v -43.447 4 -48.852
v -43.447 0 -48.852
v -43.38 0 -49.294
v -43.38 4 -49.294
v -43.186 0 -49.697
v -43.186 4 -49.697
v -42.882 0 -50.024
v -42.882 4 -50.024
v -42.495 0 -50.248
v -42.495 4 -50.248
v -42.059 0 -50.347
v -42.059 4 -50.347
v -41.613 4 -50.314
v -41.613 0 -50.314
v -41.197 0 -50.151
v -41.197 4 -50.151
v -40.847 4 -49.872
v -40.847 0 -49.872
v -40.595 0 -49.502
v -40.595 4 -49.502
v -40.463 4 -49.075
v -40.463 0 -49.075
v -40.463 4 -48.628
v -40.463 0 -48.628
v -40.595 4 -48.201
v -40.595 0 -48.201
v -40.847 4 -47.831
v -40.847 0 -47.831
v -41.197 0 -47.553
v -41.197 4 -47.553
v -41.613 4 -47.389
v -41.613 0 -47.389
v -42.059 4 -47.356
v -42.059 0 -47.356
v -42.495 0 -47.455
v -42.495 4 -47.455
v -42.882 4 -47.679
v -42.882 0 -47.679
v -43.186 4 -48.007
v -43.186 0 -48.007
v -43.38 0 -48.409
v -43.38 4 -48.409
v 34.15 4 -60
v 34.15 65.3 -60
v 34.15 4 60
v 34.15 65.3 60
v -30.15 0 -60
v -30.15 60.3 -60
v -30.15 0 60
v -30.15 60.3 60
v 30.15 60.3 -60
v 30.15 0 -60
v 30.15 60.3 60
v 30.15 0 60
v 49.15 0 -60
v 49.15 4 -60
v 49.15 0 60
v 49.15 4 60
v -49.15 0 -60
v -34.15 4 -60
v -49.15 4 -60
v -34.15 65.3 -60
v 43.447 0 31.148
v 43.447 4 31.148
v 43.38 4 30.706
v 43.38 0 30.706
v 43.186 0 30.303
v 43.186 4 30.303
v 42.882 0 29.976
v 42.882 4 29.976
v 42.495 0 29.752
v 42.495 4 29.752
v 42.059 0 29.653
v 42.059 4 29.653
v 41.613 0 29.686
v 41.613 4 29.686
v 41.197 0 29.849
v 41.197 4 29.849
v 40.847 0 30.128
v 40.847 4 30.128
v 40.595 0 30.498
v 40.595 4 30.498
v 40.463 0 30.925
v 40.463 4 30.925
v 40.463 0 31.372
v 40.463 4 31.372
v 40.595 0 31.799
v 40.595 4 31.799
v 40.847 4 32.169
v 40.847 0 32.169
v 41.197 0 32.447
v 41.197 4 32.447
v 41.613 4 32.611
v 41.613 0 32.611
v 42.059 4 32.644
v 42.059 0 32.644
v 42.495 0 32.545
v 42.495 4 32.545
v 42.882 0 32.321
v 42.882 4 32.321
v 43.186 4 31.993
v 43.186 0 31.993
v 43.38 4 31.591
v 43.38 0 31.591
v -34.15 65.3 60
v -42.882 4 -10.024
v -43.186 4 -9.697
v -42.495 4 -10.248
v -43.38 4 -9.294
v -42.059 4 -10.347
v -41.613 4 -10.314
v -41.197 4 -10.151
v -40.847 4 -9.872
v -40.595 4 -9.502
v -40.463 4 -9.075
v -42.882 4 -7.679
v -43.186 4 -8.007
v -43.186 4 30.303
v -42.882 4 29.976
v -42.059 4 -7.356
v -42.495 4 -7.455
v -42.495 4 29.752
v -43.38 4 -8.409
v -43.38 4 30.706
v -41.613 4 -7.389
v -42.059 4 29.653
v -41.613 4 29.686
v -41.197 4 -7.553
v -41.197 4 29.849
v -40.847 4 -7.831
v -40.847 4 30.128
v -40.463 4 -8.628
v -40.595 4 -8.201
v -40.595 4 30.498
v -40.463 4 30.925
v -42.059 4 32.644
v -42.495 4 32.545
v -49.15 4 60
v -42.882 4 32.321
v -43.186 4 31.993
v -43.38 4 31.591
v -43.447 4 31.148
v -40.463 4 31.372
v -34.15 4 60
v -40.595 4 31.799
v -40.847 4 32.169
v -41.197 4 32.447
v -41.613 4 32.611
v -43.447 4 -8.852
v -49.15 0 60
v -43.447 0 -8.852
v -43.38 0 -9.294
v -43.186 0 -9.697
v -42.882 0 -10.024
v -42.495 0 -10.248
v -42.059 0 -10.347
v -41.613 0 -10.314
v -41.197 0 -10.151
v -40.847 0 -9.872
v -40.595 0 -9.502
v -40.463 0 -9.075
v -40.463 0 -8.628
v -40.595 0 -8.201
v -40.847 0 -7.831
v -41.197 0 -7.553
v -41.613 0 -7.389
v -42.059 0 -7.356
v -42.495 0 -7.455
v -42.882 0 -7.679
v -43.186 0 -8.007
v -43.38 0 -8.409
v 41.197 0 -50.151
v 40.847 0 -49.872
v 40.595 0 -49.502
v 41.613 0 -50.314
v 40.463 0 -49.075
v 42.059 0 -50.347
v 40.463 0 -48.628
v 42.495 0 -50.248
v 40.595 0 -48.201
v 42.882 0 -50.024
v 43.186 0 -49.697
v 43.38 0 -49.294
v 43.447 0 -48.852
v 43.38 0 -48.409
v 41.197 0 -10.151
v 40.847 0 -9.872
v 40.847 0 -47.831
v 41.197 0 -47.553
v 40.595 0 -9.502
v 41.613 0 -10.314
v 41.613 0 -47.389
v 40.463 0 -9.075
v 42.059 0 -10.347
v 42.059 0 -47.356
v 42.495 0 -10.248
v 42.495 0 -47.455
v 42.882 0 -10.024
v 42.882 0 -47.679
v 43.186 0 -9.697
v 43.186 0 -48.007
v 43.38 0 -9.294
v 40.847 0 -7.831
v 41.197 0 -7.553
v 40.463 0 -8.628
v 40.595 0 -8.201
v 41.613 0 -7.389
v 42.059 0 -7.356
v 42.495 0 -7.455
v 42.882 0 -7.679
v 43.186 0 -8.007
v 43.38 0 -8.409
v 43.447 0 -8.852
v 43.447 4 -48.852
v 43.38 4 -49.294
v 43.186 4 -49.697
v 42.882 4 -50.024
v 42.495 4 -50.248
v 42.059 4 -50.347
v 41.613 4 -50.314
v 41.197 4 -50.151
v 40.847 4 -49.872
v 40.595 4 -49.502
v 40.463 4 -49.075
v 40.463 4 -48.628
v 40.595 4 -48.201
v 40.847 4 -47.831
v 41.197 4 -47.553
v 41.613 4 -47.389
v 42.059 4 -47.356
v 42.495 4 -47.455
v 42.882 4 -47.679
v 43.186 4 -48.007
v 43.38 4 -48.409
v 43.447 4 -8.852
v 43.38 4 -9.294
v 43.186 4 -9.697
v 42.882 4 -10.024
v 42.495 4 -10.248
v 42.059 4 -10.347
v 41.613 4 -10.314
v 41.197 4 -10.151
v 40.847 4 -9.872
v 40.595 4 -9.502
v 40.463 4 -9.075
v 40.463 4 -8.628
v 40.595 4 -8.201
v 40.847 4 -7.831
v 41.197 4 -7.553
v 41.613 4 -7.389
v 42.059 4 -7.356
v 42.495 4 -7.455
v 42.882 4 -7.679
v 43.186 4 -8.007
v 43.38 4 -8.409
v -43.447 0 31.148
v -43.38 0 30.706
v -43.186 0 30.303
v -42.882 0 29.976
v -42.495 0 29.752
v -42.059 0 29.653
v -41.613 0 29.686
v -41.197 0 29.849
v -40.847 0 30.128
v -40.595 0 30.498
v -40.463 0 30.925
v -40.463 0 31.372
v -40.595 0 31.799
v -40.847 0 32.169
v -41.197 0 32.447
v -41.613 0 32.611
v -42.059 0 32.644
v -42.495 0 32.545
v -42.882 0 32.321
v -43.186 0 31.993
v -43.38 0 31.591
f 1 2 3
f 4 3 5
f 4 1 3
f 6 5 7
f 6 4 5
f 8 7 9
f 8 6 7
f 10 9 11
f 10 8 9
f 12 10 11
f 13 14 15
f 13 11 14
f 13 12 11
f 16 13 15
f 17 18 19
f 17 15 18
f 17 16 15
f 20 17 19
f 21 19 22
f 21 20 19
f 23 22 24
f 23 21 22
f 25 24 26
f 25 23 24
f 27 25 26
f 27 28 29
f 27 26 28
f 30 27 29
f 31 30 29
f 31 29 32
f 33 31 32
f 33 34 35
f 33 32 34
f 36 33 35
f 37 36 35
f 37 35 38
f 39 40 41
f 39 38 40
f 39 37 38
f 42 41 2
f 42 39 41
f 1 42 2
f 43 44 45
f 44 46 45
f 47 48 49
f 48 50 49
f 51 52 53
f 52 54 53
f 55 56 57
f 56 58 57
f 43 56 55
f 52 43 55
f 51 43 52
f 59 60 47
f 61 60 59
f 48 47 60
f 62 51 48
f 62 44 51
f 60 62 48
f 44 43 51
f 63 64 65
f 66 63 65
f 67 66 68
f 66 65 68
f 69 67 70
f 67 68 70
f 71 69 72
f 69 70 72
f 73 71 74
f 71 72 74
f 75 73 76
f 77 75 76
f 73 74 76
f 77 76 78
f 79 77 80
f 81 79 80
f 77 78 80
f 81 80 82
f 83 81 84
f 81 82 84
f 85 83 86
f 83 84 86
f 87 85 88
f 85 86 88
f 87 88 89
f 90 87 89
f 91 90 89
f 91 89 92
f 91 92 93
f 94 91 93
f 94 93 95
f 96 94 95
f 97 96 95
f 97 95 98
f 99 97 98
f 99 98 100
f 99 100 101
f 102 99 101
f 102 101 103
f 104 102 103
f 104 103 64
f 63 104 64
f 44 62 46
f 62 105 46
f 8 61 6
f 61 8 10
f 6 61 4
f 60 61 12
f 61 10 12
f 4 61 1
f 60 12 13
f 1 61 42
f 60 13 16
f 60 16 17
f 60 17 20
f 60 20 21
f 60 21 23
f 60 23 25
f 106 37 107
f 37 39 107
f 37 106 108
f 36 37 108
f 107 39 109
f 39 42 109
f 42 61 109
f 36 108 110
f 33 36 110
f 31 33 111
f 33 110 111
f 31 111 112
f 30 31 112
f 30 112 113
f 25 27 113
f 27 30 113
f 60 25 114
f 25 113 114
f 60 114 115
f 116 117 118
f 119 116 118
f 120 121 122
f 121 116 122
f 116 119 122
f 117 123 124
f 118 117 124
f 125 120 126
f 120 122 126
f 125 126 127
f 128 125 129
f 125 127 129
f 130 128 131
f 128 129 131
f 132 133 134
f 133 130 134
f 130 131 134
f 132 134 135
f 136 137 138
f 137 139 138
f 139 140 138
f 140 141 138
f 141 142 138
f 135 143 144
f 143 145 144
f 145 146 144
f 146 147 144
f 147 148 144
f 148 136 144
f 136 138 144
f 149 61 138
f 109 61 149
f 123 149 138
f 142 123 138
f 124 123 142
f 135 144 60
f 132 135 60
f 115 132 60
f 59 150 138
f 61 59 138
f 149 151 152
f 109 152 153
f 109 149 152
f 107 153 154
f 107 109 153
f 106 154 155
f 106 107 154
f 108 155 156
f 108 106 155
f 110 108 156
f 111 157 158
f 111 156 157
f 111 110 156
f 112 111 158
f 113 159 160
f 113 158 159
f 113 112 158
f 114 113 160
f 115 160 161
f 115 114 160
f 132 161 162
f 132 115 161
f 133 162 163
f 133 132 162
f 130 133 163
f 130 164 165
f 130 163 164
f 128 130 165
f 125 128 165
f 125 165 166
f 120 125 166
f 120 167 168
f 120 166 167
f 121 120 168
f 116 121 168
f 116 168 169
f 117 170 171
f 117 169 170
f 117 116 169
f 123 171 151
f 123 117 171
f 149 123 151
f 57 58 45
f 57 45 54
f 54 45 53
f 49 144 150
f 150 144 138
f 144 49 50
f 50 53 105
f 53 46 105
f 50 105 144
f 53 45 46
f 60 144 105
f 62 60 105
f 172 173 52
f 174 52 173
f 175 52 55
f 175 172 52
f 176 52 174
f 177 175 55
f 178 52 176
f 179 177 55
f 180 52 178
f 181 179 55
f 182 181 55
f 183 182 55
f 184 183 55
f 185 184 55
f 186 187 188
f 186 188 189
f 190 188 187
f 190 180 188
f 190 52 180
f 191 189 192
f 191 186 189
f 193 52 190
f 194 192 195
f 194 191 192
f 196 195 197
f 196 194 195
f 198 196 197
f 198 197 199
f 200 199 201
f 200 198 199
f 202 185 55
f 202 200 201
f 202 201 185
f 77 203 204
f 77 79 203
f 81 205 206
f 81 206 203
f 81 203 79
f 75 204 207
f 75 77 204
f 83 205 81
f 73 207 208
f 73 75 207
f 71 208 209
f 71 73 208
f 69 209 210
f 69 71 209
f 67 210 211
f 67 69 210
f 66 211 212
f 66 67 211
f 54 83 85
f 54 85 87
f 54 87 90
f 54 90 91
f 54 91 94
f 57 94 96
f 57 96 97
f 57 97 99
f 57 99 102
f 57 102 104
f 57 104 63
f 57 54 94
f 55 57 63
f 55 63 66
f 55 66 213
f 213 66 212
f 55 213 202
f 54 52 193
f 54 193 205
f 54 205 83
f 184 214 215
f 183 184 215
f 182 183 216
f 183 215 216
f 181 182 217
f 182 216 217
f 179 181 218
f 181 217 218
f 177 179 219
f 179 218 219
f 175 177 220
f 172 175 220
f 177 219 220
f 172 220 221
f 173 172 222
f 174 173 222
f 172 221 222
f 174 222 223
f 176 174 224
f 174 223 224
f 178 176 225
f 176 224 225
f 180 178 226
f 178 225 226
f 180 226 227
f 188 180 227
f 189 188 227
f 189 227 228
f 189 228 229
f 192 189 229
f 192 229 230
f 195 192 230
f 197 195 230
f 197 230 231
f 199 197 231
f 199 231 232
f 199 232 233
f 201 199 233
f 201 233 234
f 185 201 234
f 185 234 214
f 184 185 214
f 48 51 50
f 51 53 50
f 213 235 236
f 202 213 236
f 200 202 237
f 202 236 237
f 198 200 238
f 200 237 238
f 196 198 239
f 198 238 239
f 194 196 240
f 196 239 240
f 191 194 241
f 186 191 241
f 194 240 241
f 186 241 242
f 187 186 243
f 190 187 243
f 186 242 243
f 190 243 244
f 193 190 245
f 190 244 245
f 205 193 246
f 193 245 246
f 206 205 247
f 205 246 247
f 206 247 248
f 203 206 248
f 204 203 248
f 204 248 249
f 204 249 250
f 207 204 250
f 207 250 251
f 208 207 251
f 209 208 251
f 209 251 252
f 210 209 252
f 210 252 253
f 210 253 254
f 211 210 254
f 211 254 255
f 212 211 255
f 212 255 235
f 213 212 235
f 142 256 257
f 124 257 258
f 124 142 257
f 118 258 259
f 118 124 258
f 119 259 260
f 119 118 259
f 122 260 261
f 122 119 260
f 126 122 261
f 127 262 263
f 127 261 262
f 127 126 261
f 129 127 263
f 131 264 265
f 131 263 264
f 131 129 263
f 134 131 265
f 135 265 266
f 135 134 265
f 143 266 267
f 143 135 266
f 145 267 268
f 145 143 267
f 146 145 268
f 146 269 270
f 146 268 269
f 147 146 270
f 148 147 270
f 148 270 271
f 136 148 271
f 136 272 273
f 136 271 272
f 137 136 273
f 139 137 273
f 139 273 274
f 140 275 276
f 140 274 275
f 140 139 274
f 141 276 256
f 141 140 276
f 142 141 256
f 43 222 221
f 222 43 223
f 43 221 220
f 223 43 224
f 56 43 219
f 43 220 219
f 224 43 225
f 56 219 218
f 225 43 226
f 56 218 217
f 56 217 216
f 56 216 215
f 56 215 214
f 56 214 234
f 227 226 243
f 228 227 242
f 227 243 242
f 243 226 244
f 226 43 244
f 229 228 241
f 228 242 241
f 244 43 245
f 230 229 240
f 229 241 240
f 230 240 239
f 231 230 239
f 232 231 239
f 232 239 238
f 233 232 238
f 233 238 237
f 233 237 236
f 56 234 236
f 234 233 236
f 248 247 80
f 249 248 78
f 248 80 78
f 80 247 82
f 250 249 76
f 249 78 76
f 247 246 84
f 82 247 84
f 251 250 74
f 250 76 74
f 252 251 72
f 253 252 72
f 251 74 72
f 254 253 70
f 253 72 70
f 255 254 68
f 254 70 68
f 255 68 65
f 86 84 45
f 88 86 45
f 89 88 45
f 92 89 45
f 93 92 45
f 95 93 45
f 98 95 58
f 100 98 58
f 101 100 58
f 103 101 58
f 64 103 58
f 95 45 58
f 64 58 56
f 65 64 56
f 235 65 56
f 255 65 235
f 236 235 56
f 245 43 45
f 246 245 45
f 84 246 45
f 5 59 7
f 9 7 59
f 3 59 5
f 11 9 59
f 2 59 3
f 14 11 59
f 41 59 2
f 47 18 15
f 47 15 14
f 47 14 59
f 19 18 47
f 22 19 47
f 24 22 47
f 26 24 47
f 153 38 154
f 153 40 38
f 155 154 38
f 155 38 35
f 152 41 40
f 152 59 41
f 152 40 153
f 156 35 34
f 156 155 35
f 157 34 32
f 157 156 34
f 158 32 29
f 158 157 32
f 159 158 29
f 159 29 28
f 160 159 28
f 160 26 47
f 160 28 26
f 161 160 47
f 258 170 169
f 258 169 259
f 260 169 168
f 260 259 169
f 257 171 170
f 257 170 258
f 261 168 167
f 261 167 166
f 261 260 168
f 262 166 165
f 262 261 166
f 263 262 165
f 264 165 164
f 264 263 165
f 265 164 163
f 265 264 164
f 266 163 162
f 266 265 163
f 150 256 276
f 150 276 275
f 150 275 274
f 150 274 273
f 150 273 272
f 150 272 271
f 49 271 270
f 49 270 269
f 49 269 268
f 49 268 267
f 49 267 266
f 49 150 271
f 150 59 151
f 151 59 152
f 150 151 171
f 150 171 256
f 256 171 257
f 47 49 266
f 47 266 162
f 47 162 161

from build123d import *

# Parameters (mm, degrees)
BOSS_EXTRUDE1_DEPTH      = 60
BOSS_EXTRUDE1_DEPTH_BACK = 60
SKETCH2_R                = 1.5
CUT_EXTRUDE1_DEPTH       = 99.860571008


with BuildPart() as part:
    # Sketch1 → Boss-Extrude1 (new, two sides: drawn at the far end of the back side and taken through both)
    with BuildSketch(Plane.XY.offset(-BOSS_EXTRUDE1_DEPTH_BACK)):
        Polygon((-34.15, 4), (-34.15, 65.3), (34.15, 65.3), (34.15, 4), (49.15, 4), (49.15, 0), (34.15, 0), (30.15, 0), (30.15, 60.3), (-30.15, 60.3), (-30.15, 0), (-34.15, 0), (-49.15, 0), (-49.15, 4), align=None)
    extrude(amount=BOSS_EXTRUDE1_DEPTH + BOSS_EXTRUDE1_DEPTH_BACK)

    # Sketch2 → Cut-Extrude1 (cut, through all)
    with BuildSketch(Plane(origin=(0, 4, 0), x_dir=(1, 0, 0), z_dir=(0, 1, 0))):
        with Locations((41.946567631, -31.148436051)):
            Circle(SKETCH2_R)
        with Locations((41.946567631, 8.851563949)):
            Circle(SKETCH2_R)
        with Locations((41.946567631, 48.851563949)):
            Circle(SKETCH2_R)
    cut_extrude1 = extrude(amount=-CUT_EXTRUDE1_DEPTH, mode=Mode.SUBTRACT)

    # Mirror1: Cut-Extrude1 across plane
    add(cut_extrude1.mirror(Plane(origin=(0, 0, 0), x_dir=(0, 0, 1), z_dir=(1, 0, 0))), mode=Mode.SUBTRACT)


solid = part.part
